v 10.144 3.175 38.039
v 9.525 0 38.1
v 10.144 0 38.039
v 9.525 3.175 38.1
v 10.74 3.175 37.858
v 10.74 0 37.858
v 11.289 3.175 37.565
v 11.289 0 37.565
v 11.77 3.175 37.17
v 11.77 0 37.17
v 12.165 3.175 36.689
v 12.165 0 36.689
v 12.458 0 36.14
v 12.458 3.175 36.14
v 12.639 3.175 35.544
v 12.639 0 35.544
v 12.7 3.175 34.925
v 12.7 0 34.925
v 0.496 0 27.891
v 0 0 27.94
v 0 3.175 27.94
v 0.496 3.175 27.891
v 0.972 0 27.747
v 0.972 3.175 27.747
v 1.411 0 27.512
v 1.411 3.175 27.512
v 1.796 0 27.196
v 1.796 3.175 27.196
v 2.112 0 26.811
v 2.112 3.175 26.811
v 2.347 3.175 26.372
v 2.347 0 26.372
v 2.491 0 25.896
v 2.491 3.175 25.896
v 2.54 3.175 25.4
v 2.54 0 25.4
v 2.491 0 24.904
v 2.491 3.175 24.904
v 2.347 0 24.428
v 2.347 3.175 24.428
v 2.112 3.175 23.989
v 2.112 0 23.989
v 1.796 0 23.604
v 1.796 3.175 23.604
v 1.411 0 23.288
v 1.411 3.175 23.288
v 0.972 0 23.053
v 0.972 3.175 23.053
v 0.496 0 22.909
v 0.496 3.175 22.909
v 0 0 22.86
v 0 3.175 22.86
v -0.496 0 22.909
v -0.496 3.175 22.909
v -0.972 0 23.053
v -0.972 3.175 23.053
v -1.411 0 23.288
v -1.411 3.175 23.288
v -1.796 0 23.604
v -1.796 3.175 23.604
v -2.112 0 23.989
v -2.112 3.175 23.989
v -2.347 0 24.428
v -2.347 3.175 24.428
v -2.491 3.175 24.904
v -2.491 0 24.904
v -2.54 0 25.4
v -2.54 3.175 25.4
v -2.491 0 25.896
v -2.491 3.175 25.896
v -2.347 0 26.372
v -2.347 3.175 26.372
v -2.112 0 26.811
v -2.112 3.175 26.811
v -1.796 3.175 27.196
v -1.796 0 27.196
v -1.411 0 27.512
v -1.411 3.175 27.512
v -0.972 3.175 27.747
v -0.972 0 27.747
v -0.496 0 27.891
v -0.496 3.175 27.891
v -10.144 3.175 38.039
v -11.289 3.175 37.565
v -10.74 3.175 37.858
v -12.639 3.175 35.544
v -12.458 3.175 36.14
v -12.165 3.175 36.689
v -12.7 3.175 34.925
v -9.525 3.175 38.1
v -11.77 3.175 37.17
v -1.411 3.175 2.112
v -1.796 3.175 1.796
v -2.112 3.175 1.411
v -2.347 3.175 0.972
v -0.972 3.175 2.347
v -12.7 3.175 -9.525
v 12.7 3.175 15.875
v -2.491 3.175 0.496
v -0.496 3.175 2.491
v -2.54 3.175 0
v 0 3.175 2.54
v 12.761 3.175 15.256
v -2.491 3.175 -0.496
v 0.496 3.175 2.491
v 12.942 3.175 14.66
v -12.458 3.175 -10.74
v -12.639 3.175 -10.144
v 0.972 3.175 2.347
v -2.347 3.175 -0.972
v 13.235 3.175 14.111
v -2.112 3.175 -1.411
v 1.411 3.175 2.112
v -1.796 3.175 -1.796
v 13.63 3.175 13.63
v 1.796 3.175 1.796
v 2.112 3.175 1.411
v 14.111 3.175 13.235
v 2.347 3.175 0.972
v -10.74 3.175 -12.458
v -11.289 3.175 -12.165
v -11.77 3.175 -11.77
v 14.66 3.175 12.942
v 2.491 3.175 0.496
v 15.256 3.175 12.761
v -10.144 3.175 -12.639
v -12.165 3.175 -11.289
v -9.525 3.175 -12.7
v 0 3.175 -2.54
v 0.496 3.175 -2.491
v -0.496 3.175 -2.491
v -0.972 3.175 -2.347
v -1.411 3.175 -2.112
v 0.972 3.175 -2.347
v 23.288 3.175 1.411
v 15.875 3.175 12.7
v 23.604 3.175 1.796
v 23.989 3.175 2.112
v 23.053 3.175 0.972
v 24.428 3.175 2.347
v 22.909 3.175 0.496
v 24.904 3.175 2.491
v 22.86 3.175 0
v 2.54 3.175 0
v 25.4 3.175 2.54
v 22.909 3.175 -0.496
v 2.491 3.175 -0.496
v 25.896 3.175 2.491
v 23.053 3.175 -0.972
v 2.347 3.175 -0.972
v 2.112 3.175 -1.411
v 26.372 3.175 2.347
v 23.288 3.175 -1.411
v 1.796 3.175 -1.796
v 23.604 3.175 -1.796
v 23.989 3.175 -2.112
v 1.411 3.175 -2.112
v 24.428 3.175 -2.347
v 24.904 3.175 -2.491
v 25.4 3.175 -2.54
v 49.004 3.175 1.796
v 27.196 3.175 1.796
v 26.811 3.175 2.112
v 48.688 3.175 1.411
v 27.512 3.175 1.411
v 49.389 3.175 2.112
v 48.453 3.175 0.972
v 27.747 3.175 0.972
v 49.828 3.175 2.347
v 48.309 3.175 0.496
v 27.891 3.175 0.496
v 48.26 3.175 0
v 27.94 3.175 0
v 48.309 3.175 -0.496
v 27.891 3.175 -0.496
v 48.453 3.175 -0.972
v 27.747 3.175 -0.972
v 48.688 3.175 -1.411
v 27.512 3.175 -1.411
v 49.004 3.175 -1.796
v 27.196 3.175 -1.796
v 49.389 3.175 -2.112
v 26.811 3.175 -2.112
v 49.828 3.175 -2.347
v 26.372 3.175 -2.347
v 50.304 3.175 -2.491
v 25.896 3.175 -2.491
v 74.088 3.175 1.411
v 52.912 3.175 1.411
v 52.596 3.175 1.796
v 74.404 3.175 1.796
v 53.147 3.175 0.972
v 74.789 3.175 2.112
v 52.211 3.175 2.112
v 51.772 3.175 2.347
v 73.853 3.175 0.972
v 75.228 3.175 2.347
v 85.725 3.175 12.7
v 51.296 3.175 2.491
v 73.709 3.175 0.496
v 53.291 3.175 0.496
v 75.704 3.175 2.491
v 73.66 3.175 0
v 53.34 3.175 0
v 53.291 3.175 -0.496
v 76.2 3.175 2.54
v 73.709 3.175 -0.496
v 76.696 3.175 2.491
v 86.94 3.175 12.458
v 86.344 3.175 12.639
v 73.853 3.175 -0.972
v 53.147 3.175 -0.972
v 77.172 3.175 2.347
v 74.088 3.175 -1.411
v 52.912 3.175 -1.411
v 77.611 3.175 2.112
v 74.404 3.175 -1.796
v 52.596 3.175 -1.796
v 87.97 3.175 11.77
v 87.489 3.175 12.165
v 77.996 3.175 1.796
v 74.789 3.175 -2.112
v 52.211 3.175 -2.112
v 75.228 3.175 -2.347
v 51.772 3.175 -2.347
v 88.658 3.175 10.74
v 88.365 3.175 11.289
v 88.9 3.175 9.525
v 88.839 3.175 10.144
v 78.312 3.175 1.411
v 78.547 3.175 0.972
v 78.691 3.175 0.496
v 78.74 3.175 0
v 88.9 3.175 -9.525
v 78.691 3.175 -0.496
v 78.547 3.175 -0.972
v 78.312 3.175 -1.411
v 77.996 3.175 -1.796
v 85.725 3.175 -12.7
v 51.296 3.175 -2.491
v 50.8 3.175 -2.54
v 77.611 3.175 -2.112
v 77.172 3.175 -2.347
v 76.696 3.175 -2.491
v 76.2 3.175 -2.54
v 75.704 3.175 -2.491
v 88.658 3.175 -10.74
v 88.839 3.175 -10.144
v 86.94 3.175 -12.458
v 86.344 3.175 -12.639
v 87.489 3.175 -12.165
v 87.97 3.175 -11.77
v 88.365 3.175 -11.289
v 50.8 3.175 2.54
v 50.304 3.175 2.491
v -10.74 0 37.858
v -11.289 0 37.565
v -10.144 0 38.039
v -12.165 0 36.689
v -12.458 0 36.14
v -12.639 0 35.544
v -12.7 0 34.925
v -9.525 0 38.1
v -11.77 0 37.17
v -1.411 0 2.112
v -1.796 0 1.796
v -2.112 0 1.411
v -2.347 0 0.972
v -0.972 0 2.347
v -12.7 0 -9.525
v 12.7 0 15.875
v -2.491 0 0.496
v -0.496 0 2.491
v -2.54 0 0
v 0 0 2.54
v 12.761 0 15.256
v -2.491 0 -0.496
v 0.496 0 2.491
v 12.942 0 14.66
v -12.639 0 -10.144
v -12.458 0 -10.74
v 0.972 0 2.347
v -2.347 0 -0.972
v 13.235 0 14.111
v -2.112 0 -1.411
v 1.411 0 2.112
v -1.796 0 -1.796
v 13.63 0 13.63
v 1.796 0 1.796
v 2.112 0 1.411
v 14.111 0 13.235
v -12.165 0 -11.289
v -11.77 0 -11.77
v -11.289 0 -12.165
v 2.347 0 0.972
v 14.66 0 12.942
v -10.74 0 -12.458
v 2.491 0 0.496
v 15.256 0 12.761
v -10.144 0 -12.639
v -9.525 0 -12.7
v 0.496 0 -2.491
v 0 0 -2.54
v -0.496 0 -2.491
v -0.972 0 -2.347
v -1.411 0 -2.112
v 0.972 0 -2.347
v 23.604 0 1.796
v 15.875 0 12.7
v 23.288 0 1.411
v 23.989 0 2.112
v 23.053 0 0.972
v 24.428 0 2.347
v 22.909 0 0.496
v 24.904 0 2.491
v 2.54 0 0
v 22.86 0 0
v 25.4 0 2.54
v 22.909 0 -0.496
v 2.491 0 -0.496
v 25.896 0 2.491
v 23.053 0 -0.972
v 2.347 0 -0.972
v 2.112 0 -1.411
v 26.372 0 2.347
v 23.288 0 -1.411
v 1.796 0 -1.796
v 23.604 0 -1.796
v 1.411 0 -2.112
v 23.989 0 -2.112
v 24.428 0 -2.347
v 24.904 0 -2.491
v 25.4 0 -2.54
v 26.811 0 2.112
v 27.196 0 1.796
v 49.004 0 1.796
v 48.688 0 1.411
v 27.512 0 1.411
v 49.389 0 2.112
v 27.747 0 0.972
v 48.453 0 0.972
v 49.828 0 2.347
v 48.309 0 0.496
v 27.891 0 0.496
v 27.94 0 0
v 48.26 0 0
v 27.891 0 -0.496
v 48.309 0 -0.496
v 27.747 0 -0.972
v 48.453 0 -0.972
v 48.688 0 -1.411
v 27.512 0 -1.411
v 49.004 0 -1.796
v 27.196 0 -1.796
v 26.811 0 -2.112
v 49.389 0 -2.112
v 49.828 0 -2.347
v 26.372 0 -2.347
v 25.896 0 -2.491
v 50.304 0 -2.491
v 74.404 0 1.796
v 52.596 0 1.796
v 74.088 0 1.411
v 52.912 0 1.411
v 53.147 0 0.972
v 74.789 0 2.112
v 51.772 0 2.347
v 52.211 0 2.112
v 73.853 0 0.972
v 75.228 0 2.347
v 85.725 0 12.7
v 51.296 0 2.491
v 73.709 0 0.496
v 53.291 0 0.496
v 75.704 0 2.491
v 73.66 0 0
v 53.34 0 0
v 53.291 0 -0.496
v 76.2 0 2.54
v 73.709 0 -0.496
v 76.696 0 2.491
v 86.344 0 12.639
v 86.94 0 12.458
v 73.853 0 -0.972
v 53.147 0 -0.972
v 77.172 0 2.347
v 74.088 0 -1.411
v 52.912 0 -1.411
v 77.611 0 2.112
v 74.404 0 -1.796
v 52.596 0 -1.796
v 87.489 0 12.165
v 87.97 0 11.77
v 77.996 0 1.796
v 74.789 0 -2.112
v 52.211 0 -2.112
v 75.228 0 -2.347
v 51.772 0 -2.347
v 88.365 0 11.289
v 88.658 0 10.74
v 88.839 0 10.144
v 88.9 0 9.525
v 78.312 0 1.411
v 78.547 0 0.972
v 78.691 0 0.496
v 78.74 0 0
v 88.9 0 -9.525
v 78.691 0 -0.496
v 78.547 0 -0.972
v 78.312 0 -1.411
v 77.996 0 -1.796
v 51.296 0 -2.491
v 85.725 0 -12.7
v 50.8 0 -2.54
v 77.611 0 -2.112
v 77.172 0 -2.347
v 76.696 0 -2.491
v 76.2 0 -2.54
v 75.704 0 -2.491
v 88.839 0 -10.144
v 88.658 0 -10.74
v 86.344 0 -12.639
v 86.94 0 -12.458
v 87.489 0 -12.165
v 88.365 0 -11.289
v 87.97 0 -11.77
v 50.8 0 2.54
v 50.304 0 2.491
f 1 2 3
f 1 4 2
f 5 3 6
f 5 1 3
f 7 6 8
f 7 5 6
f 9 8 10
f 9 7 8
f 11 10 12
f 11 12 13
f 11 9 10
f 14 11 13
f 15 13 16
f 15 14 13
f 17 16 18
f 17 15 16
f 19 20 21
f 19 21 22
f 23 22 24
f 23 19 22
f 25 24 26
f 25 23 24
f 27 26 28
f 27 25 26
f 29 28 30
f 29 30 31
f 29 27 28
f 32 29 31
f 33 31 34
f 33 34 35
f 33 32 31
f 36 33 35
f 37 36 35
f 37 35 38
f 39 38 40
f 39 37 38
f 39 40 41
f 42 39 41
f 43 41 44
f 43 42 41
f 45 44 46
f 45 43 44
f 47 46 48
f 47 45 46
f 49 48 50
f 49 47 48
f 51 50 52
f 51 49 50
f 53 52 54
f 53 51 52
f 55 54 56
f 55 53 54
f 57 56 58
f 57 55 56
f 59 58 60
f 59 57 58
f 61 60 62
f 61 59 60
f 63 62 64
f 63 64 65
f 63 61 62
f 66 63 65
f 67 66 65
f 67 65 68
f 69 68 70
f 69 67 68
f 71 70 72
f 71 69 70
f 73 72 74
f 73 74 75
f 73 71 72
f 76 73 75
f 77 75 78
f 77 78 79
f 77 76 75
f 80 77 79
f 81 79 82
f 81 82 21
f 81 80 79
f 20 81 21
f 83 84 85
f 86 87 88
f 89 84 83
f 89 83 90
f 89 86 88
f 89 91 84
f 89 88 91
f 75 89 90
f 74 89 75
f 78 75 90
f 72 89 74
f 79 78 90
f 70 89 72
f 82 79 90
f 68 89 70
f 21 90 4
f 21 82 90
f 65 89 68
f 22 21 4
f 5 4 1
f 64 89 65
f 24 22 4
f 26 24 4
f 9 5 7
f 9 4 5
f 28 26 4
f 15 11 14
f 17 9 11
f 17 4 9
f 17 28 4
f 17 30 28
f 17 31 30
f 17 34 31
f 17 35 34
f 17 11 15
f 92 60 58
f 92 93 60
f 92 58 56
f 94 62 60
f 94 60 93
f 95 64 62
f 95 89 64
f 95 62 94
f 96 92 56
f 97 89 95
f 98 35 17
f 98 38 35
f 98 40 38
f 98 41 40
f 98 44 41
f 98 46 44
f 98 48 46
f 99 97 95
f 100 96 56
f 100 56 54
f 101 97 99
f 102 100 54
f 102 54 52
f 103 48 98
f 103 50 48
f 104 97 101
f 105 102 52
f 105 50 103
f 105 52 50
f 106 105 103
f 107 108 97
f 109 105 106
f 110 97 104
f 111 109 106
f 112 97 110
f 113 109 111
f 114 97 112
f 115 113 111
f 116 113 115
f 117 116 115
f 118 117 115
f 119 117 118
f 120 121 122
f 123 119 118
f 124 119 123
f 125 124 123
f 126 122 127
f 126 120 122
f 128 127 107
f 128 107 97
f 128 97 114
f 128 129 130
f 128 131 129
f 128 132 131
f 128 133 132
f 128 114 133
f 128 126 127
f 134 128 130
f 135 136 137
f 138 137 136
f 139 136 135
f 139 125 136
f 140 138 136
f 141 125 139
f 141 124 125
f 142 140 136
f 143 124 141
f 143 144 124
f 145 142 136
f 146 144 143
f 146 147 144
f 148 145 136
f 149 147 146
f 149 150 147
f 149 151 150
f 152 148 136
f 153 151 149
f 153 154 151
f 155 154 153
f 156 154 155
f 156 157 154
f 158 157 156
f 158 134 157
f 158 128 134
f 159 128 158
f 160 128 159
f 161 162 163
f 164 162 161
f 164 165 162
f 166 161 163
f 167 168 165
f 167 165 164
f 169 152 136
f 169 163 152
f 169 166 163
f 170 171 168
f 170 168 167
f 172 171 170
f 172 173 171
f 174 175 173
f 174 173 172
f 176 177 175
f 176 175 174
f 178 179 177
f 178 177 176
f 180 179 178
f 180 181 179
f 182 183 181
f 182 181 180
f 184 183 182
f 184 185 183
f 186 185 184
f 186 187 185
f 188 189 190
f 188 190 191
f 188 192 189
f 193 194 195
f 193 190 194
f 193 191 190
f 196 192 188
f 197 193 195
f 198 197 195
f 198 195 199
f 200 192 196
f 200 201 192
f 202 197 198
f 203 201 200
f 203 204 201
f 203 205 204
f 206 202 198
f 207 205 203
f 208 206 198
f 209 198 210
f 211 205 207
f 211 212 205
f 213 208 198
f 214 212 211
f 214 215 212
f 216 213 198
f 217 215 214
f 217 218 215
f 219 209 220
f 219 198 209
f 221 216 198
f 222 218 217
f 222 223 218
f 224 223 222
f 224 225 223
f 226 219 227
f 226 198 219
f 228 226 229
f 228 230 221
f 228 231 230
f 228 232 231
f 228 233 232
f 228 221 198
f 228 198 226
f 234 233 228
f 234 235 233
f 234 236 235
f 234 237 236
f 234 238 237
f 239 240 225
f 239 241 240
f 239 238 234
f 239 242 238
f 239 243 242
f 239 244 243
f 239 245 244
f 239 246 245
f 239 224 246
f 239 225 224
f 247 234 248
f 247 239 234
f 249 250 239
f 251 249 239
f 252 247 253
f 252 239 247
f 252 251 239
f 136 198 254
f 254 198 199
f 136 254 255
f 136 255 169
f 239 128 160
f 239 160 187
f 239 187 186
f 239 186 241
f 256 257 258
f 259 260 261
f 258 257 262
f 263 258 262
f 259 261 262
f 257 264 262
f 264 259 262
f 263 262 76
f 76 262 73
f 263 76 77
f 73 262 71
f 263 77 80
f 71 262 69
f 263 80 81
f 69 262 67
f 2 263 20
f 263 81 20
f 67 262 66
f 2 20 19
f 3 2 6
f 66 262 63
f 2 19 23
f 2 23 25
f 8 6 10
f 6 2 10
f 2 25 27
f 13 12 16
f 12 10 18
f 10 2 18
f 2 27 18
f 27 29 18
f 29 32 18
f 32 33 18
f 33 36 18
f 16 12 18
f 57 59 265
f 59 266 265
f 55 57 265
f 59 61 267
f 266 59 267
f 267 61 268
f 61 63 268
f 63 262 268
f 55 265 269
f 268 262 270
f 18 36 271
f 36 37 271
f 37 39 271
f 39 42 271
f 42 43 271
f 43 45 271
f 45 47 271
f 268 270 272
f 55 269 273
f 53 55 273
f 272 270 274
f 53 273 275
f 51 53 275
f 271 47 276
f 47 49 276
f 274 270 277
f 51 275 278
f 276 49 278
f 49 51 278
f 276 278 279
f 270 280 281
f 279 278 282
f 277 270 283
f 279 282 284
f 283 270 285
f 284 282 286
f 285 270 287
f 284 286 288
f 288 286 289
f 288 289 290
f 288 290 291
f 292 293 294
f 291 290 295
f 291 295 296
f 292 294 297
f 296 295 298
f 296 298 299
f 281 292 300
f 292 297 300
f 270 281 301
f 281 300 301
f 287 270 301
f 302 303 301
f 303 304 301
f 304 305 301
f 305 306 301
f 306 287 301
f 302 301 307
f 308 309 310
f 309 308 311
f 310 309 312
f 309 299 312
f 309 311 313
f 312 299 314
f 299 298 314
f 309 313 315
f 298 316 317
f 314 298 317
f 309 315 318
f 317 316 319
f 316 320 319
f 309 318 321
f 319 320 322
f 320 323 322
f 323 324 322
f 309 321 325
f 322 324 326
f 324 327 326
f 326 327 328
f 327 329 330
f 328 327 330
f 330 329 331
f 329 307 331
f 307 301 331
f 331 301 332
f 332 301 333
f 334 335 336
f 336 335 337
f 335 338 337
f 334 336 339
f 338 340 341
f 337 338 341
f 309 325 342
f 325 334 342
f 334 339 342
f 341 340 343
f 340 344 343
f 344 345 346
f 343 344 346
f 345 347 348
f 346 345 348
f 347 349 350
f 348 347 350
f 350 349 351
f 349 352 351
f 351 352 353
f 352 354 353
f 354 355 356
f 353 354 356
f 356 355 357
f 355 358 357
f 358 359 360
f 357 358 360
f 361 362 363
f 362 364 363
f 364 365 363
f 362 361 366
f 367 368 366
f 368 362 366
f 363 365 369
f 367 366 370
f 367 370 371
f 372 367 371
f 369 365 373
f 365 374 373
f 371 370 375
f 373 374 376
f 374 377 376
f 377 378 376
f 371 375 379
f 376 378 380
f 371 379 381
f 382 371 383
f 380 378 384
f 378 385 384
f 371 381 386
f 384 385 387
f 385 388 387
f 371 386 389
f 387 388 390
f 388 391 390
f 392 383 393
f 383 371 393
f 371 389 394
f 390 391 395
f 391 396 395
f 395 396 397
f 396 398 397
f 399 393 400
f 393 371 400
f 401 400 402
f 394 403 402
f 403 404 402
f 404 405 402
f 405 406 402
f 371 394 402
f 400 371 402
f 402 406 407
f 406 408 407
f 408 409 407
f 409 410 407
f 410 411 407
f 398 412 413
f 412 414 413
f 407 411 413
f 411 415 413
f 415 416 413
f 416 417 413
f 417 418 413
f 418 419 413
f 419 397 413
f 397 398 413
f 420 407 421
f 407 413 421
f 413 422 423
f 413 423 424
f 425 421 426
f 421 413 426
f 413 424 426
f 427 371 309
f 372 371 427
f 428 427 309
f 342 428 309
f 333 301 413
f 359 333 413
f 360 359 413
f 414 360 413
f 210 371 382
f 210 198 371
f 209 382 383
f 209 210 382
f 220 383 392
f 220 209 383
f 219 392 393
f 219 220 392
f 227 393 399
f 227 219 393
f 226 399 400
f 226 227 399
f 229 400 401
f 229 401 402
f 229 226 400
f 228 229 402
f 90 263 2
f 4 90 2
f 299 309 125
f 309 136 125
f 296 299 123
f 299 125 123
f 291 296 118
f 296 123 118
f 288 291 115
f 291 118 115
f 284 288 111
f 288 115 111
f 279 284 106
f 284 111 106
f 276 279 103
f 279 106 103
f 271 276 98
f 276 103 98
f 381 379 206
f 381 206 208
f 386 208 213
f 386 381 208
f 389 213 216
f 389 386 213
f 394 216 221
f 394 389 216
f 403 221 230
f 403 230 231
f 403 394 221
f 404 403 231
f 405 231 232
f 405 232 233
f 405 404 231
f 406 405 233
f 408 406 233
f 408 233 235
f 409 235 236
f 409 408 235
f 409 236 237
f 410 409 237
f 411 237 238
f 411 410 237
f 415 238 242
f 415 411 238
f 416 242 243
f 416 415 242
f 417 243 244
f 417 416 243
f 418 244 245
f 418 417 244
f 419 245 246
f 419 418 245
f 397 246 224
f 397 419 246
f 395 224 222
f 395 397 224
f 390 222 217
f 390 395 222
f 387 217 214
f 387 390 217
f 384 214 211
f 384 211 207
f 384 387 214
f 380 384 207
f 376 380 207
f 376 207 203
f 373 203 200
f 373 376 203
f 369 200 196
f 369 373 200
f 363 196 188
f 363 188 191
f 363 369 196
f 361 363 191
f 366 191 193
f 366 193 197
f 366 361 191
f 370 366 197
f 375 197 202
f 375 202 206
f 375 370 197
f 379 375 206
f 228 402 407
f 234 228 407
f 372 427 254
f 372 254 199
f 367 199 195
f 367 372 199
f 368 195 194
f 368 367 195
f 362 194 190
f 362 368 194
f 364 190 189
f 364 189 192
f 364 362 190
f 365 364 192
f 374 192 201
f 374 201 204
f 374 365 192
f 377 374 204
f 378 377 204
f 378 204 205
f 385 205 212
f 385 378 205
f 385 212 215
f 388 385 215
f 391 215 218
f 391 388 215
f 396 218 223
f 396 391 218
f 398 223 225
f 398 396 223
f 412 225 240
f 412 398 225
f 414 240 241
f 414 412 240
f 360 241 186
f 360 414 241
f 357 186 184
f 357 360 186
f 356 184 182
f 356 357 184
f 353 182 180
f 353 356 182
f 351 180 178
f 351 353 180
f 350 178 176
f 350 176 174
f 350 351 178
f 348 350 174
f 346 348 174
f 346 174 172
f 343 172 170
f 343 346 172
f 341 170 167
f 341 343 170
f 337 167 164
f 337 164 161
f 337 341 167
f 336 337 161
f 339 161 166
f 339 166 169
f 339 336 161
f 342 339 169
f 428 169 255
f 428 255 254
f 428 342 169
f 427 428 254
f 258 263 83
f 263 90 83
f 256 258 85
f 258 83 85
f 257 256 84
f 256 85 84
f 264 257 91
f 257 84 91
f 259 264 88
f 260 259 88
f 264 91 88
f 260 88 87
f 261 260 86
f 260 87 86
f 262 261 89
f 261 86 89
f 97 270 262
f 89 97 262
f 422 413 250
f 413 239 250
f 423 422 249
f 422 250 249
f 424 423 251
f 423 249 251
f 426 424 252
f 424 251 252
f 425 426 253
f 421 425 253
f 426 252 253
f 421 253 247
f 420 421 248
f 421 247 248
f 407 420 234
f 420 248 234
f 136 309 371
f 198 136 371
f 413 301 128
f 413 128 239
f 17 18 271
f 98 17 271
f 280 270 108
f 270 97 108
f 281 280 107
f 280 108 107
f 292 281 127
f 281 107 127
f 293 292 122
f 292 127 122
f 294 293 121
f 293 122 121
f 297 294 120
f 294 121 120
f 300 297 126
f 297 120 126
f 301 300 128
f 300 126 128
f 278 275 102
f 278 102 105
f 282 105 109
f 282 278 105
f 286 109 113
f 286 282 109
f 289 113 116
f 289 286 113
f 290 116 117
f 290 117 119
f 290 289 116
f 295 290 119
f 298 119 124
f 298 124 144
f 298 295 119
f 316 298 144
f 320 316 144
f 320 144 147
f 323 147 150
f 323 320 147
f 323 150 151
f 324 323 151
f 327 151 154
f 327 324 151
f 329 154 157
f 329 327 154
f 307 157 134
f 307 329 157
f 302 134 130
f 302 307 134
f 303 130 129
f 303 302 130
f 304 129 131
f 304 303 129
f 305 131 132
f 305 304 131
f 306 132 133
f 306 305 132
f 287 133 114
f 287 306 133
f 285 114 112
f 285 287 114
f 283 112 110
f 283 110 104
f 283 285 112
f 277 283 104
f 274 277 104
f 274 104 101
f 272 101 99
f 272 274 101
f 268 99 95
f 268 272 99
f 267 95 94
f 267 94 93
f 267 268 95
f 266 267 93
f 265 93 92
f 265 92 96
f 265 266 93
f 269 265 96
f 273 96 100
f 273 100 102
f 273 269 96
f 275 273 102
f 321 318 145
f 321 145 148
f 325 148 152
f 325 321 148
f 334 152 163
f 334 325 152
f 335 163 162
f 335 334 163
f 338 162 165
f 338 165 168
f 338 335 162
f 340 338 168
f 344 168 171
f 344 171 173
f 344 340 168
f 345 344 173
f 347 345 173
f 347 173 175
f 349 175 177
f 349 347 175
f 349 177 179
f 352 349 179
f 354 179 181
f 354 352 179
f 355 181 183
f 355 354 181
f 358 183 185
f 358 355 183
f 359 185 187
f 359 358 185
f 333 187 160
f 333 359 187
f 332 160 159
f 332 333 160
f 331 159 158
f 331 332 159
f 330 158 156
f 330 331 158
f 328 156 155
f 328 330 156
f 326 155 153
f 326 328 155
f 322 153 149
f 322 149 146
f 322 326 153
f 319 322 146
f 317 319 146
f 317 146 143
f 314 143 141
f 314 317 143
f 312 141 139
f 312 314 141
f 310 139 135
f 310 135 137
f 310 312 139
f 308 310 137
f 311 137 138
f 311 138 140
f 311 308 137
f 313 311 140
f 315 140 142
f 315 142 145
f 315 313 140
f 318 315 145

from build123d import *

# Parameters (mm, degrees)
SKETCH1_R           = 2.54
SKETCH1_W           = 76.2
SKETCH1_H           = 25.4
BOSS_EXTRUDE1_DEPTH = 3.175
FILLET1_R           = 3.175


with BuildPart() as part:
    # Sketch1 → Boss-Extrude1 (new body)
    # profile 1 of 2: a face of its own
    with BuildSketch(Plane(origin=(0, 0, 0), x_dir=(1, 0, 0), z_dir=(0, 1, 0))):
        Polygon((12.7, 12.7), (-12.7, 12.7), (-12.7, -38.1), (12.7, -38.1), (12.7, -12.7), align=None)
        with Locations(Location((0, -25.4, 0), (0, 0, 270))):
            Circle(SKETCH1_R, mode=Mode.SUBTRACT)
        with Locations(Location((0, 0, 0), (0, 0, 270))):
            Circle(SKETCH1_R, mode=Mode.SUBTRACT)
    # profile 2 of 2: a face of its own
    with BuildSketch(Plane(origin=(0, 0, 0), x_dir=(1, 0, 0), z_dir=(0, 1, 0))):
        with Locations((50.8, 0)):
            Rectangle(SKETCH1_W, SKETCH1_H)
        with Locations(Location((25.4, 0, 0), (0, 0, 270))):
            Circle(SKETCH1_R, mode=Mode.SUBTRACT)
        with Locations(Location((50.8, 0, 0), (0, 0, 270))):
            Circle(SKETCH1_R, mode=Mode.SUBTRACT)
        with Locations(Location((76.2, 0, 0), (0, 0, 270))):
            Circle(SKETCH1_R, mode=Mode.SUBTRACT)
    extrude(amount=BOSS_EXTRUDE1_DEPTH)

    # Fillet1
    fillet1_edges = [part.edges().sort_by_distance(p)[0] for p in [
        (12.7, 1.5875, 38.1),
        (-12.7, 1.5875, 38.1),
        (-12.7, 1.5875, -12.7),
        (88.9, 1.5875, -12.7),
        (88.9, 1.5875, 12.7),
        (12.7, 1.5875, 12.7),
    ]]
    fillet(fillet1_edges, radius=FILLET1_R)


solid = part.part
